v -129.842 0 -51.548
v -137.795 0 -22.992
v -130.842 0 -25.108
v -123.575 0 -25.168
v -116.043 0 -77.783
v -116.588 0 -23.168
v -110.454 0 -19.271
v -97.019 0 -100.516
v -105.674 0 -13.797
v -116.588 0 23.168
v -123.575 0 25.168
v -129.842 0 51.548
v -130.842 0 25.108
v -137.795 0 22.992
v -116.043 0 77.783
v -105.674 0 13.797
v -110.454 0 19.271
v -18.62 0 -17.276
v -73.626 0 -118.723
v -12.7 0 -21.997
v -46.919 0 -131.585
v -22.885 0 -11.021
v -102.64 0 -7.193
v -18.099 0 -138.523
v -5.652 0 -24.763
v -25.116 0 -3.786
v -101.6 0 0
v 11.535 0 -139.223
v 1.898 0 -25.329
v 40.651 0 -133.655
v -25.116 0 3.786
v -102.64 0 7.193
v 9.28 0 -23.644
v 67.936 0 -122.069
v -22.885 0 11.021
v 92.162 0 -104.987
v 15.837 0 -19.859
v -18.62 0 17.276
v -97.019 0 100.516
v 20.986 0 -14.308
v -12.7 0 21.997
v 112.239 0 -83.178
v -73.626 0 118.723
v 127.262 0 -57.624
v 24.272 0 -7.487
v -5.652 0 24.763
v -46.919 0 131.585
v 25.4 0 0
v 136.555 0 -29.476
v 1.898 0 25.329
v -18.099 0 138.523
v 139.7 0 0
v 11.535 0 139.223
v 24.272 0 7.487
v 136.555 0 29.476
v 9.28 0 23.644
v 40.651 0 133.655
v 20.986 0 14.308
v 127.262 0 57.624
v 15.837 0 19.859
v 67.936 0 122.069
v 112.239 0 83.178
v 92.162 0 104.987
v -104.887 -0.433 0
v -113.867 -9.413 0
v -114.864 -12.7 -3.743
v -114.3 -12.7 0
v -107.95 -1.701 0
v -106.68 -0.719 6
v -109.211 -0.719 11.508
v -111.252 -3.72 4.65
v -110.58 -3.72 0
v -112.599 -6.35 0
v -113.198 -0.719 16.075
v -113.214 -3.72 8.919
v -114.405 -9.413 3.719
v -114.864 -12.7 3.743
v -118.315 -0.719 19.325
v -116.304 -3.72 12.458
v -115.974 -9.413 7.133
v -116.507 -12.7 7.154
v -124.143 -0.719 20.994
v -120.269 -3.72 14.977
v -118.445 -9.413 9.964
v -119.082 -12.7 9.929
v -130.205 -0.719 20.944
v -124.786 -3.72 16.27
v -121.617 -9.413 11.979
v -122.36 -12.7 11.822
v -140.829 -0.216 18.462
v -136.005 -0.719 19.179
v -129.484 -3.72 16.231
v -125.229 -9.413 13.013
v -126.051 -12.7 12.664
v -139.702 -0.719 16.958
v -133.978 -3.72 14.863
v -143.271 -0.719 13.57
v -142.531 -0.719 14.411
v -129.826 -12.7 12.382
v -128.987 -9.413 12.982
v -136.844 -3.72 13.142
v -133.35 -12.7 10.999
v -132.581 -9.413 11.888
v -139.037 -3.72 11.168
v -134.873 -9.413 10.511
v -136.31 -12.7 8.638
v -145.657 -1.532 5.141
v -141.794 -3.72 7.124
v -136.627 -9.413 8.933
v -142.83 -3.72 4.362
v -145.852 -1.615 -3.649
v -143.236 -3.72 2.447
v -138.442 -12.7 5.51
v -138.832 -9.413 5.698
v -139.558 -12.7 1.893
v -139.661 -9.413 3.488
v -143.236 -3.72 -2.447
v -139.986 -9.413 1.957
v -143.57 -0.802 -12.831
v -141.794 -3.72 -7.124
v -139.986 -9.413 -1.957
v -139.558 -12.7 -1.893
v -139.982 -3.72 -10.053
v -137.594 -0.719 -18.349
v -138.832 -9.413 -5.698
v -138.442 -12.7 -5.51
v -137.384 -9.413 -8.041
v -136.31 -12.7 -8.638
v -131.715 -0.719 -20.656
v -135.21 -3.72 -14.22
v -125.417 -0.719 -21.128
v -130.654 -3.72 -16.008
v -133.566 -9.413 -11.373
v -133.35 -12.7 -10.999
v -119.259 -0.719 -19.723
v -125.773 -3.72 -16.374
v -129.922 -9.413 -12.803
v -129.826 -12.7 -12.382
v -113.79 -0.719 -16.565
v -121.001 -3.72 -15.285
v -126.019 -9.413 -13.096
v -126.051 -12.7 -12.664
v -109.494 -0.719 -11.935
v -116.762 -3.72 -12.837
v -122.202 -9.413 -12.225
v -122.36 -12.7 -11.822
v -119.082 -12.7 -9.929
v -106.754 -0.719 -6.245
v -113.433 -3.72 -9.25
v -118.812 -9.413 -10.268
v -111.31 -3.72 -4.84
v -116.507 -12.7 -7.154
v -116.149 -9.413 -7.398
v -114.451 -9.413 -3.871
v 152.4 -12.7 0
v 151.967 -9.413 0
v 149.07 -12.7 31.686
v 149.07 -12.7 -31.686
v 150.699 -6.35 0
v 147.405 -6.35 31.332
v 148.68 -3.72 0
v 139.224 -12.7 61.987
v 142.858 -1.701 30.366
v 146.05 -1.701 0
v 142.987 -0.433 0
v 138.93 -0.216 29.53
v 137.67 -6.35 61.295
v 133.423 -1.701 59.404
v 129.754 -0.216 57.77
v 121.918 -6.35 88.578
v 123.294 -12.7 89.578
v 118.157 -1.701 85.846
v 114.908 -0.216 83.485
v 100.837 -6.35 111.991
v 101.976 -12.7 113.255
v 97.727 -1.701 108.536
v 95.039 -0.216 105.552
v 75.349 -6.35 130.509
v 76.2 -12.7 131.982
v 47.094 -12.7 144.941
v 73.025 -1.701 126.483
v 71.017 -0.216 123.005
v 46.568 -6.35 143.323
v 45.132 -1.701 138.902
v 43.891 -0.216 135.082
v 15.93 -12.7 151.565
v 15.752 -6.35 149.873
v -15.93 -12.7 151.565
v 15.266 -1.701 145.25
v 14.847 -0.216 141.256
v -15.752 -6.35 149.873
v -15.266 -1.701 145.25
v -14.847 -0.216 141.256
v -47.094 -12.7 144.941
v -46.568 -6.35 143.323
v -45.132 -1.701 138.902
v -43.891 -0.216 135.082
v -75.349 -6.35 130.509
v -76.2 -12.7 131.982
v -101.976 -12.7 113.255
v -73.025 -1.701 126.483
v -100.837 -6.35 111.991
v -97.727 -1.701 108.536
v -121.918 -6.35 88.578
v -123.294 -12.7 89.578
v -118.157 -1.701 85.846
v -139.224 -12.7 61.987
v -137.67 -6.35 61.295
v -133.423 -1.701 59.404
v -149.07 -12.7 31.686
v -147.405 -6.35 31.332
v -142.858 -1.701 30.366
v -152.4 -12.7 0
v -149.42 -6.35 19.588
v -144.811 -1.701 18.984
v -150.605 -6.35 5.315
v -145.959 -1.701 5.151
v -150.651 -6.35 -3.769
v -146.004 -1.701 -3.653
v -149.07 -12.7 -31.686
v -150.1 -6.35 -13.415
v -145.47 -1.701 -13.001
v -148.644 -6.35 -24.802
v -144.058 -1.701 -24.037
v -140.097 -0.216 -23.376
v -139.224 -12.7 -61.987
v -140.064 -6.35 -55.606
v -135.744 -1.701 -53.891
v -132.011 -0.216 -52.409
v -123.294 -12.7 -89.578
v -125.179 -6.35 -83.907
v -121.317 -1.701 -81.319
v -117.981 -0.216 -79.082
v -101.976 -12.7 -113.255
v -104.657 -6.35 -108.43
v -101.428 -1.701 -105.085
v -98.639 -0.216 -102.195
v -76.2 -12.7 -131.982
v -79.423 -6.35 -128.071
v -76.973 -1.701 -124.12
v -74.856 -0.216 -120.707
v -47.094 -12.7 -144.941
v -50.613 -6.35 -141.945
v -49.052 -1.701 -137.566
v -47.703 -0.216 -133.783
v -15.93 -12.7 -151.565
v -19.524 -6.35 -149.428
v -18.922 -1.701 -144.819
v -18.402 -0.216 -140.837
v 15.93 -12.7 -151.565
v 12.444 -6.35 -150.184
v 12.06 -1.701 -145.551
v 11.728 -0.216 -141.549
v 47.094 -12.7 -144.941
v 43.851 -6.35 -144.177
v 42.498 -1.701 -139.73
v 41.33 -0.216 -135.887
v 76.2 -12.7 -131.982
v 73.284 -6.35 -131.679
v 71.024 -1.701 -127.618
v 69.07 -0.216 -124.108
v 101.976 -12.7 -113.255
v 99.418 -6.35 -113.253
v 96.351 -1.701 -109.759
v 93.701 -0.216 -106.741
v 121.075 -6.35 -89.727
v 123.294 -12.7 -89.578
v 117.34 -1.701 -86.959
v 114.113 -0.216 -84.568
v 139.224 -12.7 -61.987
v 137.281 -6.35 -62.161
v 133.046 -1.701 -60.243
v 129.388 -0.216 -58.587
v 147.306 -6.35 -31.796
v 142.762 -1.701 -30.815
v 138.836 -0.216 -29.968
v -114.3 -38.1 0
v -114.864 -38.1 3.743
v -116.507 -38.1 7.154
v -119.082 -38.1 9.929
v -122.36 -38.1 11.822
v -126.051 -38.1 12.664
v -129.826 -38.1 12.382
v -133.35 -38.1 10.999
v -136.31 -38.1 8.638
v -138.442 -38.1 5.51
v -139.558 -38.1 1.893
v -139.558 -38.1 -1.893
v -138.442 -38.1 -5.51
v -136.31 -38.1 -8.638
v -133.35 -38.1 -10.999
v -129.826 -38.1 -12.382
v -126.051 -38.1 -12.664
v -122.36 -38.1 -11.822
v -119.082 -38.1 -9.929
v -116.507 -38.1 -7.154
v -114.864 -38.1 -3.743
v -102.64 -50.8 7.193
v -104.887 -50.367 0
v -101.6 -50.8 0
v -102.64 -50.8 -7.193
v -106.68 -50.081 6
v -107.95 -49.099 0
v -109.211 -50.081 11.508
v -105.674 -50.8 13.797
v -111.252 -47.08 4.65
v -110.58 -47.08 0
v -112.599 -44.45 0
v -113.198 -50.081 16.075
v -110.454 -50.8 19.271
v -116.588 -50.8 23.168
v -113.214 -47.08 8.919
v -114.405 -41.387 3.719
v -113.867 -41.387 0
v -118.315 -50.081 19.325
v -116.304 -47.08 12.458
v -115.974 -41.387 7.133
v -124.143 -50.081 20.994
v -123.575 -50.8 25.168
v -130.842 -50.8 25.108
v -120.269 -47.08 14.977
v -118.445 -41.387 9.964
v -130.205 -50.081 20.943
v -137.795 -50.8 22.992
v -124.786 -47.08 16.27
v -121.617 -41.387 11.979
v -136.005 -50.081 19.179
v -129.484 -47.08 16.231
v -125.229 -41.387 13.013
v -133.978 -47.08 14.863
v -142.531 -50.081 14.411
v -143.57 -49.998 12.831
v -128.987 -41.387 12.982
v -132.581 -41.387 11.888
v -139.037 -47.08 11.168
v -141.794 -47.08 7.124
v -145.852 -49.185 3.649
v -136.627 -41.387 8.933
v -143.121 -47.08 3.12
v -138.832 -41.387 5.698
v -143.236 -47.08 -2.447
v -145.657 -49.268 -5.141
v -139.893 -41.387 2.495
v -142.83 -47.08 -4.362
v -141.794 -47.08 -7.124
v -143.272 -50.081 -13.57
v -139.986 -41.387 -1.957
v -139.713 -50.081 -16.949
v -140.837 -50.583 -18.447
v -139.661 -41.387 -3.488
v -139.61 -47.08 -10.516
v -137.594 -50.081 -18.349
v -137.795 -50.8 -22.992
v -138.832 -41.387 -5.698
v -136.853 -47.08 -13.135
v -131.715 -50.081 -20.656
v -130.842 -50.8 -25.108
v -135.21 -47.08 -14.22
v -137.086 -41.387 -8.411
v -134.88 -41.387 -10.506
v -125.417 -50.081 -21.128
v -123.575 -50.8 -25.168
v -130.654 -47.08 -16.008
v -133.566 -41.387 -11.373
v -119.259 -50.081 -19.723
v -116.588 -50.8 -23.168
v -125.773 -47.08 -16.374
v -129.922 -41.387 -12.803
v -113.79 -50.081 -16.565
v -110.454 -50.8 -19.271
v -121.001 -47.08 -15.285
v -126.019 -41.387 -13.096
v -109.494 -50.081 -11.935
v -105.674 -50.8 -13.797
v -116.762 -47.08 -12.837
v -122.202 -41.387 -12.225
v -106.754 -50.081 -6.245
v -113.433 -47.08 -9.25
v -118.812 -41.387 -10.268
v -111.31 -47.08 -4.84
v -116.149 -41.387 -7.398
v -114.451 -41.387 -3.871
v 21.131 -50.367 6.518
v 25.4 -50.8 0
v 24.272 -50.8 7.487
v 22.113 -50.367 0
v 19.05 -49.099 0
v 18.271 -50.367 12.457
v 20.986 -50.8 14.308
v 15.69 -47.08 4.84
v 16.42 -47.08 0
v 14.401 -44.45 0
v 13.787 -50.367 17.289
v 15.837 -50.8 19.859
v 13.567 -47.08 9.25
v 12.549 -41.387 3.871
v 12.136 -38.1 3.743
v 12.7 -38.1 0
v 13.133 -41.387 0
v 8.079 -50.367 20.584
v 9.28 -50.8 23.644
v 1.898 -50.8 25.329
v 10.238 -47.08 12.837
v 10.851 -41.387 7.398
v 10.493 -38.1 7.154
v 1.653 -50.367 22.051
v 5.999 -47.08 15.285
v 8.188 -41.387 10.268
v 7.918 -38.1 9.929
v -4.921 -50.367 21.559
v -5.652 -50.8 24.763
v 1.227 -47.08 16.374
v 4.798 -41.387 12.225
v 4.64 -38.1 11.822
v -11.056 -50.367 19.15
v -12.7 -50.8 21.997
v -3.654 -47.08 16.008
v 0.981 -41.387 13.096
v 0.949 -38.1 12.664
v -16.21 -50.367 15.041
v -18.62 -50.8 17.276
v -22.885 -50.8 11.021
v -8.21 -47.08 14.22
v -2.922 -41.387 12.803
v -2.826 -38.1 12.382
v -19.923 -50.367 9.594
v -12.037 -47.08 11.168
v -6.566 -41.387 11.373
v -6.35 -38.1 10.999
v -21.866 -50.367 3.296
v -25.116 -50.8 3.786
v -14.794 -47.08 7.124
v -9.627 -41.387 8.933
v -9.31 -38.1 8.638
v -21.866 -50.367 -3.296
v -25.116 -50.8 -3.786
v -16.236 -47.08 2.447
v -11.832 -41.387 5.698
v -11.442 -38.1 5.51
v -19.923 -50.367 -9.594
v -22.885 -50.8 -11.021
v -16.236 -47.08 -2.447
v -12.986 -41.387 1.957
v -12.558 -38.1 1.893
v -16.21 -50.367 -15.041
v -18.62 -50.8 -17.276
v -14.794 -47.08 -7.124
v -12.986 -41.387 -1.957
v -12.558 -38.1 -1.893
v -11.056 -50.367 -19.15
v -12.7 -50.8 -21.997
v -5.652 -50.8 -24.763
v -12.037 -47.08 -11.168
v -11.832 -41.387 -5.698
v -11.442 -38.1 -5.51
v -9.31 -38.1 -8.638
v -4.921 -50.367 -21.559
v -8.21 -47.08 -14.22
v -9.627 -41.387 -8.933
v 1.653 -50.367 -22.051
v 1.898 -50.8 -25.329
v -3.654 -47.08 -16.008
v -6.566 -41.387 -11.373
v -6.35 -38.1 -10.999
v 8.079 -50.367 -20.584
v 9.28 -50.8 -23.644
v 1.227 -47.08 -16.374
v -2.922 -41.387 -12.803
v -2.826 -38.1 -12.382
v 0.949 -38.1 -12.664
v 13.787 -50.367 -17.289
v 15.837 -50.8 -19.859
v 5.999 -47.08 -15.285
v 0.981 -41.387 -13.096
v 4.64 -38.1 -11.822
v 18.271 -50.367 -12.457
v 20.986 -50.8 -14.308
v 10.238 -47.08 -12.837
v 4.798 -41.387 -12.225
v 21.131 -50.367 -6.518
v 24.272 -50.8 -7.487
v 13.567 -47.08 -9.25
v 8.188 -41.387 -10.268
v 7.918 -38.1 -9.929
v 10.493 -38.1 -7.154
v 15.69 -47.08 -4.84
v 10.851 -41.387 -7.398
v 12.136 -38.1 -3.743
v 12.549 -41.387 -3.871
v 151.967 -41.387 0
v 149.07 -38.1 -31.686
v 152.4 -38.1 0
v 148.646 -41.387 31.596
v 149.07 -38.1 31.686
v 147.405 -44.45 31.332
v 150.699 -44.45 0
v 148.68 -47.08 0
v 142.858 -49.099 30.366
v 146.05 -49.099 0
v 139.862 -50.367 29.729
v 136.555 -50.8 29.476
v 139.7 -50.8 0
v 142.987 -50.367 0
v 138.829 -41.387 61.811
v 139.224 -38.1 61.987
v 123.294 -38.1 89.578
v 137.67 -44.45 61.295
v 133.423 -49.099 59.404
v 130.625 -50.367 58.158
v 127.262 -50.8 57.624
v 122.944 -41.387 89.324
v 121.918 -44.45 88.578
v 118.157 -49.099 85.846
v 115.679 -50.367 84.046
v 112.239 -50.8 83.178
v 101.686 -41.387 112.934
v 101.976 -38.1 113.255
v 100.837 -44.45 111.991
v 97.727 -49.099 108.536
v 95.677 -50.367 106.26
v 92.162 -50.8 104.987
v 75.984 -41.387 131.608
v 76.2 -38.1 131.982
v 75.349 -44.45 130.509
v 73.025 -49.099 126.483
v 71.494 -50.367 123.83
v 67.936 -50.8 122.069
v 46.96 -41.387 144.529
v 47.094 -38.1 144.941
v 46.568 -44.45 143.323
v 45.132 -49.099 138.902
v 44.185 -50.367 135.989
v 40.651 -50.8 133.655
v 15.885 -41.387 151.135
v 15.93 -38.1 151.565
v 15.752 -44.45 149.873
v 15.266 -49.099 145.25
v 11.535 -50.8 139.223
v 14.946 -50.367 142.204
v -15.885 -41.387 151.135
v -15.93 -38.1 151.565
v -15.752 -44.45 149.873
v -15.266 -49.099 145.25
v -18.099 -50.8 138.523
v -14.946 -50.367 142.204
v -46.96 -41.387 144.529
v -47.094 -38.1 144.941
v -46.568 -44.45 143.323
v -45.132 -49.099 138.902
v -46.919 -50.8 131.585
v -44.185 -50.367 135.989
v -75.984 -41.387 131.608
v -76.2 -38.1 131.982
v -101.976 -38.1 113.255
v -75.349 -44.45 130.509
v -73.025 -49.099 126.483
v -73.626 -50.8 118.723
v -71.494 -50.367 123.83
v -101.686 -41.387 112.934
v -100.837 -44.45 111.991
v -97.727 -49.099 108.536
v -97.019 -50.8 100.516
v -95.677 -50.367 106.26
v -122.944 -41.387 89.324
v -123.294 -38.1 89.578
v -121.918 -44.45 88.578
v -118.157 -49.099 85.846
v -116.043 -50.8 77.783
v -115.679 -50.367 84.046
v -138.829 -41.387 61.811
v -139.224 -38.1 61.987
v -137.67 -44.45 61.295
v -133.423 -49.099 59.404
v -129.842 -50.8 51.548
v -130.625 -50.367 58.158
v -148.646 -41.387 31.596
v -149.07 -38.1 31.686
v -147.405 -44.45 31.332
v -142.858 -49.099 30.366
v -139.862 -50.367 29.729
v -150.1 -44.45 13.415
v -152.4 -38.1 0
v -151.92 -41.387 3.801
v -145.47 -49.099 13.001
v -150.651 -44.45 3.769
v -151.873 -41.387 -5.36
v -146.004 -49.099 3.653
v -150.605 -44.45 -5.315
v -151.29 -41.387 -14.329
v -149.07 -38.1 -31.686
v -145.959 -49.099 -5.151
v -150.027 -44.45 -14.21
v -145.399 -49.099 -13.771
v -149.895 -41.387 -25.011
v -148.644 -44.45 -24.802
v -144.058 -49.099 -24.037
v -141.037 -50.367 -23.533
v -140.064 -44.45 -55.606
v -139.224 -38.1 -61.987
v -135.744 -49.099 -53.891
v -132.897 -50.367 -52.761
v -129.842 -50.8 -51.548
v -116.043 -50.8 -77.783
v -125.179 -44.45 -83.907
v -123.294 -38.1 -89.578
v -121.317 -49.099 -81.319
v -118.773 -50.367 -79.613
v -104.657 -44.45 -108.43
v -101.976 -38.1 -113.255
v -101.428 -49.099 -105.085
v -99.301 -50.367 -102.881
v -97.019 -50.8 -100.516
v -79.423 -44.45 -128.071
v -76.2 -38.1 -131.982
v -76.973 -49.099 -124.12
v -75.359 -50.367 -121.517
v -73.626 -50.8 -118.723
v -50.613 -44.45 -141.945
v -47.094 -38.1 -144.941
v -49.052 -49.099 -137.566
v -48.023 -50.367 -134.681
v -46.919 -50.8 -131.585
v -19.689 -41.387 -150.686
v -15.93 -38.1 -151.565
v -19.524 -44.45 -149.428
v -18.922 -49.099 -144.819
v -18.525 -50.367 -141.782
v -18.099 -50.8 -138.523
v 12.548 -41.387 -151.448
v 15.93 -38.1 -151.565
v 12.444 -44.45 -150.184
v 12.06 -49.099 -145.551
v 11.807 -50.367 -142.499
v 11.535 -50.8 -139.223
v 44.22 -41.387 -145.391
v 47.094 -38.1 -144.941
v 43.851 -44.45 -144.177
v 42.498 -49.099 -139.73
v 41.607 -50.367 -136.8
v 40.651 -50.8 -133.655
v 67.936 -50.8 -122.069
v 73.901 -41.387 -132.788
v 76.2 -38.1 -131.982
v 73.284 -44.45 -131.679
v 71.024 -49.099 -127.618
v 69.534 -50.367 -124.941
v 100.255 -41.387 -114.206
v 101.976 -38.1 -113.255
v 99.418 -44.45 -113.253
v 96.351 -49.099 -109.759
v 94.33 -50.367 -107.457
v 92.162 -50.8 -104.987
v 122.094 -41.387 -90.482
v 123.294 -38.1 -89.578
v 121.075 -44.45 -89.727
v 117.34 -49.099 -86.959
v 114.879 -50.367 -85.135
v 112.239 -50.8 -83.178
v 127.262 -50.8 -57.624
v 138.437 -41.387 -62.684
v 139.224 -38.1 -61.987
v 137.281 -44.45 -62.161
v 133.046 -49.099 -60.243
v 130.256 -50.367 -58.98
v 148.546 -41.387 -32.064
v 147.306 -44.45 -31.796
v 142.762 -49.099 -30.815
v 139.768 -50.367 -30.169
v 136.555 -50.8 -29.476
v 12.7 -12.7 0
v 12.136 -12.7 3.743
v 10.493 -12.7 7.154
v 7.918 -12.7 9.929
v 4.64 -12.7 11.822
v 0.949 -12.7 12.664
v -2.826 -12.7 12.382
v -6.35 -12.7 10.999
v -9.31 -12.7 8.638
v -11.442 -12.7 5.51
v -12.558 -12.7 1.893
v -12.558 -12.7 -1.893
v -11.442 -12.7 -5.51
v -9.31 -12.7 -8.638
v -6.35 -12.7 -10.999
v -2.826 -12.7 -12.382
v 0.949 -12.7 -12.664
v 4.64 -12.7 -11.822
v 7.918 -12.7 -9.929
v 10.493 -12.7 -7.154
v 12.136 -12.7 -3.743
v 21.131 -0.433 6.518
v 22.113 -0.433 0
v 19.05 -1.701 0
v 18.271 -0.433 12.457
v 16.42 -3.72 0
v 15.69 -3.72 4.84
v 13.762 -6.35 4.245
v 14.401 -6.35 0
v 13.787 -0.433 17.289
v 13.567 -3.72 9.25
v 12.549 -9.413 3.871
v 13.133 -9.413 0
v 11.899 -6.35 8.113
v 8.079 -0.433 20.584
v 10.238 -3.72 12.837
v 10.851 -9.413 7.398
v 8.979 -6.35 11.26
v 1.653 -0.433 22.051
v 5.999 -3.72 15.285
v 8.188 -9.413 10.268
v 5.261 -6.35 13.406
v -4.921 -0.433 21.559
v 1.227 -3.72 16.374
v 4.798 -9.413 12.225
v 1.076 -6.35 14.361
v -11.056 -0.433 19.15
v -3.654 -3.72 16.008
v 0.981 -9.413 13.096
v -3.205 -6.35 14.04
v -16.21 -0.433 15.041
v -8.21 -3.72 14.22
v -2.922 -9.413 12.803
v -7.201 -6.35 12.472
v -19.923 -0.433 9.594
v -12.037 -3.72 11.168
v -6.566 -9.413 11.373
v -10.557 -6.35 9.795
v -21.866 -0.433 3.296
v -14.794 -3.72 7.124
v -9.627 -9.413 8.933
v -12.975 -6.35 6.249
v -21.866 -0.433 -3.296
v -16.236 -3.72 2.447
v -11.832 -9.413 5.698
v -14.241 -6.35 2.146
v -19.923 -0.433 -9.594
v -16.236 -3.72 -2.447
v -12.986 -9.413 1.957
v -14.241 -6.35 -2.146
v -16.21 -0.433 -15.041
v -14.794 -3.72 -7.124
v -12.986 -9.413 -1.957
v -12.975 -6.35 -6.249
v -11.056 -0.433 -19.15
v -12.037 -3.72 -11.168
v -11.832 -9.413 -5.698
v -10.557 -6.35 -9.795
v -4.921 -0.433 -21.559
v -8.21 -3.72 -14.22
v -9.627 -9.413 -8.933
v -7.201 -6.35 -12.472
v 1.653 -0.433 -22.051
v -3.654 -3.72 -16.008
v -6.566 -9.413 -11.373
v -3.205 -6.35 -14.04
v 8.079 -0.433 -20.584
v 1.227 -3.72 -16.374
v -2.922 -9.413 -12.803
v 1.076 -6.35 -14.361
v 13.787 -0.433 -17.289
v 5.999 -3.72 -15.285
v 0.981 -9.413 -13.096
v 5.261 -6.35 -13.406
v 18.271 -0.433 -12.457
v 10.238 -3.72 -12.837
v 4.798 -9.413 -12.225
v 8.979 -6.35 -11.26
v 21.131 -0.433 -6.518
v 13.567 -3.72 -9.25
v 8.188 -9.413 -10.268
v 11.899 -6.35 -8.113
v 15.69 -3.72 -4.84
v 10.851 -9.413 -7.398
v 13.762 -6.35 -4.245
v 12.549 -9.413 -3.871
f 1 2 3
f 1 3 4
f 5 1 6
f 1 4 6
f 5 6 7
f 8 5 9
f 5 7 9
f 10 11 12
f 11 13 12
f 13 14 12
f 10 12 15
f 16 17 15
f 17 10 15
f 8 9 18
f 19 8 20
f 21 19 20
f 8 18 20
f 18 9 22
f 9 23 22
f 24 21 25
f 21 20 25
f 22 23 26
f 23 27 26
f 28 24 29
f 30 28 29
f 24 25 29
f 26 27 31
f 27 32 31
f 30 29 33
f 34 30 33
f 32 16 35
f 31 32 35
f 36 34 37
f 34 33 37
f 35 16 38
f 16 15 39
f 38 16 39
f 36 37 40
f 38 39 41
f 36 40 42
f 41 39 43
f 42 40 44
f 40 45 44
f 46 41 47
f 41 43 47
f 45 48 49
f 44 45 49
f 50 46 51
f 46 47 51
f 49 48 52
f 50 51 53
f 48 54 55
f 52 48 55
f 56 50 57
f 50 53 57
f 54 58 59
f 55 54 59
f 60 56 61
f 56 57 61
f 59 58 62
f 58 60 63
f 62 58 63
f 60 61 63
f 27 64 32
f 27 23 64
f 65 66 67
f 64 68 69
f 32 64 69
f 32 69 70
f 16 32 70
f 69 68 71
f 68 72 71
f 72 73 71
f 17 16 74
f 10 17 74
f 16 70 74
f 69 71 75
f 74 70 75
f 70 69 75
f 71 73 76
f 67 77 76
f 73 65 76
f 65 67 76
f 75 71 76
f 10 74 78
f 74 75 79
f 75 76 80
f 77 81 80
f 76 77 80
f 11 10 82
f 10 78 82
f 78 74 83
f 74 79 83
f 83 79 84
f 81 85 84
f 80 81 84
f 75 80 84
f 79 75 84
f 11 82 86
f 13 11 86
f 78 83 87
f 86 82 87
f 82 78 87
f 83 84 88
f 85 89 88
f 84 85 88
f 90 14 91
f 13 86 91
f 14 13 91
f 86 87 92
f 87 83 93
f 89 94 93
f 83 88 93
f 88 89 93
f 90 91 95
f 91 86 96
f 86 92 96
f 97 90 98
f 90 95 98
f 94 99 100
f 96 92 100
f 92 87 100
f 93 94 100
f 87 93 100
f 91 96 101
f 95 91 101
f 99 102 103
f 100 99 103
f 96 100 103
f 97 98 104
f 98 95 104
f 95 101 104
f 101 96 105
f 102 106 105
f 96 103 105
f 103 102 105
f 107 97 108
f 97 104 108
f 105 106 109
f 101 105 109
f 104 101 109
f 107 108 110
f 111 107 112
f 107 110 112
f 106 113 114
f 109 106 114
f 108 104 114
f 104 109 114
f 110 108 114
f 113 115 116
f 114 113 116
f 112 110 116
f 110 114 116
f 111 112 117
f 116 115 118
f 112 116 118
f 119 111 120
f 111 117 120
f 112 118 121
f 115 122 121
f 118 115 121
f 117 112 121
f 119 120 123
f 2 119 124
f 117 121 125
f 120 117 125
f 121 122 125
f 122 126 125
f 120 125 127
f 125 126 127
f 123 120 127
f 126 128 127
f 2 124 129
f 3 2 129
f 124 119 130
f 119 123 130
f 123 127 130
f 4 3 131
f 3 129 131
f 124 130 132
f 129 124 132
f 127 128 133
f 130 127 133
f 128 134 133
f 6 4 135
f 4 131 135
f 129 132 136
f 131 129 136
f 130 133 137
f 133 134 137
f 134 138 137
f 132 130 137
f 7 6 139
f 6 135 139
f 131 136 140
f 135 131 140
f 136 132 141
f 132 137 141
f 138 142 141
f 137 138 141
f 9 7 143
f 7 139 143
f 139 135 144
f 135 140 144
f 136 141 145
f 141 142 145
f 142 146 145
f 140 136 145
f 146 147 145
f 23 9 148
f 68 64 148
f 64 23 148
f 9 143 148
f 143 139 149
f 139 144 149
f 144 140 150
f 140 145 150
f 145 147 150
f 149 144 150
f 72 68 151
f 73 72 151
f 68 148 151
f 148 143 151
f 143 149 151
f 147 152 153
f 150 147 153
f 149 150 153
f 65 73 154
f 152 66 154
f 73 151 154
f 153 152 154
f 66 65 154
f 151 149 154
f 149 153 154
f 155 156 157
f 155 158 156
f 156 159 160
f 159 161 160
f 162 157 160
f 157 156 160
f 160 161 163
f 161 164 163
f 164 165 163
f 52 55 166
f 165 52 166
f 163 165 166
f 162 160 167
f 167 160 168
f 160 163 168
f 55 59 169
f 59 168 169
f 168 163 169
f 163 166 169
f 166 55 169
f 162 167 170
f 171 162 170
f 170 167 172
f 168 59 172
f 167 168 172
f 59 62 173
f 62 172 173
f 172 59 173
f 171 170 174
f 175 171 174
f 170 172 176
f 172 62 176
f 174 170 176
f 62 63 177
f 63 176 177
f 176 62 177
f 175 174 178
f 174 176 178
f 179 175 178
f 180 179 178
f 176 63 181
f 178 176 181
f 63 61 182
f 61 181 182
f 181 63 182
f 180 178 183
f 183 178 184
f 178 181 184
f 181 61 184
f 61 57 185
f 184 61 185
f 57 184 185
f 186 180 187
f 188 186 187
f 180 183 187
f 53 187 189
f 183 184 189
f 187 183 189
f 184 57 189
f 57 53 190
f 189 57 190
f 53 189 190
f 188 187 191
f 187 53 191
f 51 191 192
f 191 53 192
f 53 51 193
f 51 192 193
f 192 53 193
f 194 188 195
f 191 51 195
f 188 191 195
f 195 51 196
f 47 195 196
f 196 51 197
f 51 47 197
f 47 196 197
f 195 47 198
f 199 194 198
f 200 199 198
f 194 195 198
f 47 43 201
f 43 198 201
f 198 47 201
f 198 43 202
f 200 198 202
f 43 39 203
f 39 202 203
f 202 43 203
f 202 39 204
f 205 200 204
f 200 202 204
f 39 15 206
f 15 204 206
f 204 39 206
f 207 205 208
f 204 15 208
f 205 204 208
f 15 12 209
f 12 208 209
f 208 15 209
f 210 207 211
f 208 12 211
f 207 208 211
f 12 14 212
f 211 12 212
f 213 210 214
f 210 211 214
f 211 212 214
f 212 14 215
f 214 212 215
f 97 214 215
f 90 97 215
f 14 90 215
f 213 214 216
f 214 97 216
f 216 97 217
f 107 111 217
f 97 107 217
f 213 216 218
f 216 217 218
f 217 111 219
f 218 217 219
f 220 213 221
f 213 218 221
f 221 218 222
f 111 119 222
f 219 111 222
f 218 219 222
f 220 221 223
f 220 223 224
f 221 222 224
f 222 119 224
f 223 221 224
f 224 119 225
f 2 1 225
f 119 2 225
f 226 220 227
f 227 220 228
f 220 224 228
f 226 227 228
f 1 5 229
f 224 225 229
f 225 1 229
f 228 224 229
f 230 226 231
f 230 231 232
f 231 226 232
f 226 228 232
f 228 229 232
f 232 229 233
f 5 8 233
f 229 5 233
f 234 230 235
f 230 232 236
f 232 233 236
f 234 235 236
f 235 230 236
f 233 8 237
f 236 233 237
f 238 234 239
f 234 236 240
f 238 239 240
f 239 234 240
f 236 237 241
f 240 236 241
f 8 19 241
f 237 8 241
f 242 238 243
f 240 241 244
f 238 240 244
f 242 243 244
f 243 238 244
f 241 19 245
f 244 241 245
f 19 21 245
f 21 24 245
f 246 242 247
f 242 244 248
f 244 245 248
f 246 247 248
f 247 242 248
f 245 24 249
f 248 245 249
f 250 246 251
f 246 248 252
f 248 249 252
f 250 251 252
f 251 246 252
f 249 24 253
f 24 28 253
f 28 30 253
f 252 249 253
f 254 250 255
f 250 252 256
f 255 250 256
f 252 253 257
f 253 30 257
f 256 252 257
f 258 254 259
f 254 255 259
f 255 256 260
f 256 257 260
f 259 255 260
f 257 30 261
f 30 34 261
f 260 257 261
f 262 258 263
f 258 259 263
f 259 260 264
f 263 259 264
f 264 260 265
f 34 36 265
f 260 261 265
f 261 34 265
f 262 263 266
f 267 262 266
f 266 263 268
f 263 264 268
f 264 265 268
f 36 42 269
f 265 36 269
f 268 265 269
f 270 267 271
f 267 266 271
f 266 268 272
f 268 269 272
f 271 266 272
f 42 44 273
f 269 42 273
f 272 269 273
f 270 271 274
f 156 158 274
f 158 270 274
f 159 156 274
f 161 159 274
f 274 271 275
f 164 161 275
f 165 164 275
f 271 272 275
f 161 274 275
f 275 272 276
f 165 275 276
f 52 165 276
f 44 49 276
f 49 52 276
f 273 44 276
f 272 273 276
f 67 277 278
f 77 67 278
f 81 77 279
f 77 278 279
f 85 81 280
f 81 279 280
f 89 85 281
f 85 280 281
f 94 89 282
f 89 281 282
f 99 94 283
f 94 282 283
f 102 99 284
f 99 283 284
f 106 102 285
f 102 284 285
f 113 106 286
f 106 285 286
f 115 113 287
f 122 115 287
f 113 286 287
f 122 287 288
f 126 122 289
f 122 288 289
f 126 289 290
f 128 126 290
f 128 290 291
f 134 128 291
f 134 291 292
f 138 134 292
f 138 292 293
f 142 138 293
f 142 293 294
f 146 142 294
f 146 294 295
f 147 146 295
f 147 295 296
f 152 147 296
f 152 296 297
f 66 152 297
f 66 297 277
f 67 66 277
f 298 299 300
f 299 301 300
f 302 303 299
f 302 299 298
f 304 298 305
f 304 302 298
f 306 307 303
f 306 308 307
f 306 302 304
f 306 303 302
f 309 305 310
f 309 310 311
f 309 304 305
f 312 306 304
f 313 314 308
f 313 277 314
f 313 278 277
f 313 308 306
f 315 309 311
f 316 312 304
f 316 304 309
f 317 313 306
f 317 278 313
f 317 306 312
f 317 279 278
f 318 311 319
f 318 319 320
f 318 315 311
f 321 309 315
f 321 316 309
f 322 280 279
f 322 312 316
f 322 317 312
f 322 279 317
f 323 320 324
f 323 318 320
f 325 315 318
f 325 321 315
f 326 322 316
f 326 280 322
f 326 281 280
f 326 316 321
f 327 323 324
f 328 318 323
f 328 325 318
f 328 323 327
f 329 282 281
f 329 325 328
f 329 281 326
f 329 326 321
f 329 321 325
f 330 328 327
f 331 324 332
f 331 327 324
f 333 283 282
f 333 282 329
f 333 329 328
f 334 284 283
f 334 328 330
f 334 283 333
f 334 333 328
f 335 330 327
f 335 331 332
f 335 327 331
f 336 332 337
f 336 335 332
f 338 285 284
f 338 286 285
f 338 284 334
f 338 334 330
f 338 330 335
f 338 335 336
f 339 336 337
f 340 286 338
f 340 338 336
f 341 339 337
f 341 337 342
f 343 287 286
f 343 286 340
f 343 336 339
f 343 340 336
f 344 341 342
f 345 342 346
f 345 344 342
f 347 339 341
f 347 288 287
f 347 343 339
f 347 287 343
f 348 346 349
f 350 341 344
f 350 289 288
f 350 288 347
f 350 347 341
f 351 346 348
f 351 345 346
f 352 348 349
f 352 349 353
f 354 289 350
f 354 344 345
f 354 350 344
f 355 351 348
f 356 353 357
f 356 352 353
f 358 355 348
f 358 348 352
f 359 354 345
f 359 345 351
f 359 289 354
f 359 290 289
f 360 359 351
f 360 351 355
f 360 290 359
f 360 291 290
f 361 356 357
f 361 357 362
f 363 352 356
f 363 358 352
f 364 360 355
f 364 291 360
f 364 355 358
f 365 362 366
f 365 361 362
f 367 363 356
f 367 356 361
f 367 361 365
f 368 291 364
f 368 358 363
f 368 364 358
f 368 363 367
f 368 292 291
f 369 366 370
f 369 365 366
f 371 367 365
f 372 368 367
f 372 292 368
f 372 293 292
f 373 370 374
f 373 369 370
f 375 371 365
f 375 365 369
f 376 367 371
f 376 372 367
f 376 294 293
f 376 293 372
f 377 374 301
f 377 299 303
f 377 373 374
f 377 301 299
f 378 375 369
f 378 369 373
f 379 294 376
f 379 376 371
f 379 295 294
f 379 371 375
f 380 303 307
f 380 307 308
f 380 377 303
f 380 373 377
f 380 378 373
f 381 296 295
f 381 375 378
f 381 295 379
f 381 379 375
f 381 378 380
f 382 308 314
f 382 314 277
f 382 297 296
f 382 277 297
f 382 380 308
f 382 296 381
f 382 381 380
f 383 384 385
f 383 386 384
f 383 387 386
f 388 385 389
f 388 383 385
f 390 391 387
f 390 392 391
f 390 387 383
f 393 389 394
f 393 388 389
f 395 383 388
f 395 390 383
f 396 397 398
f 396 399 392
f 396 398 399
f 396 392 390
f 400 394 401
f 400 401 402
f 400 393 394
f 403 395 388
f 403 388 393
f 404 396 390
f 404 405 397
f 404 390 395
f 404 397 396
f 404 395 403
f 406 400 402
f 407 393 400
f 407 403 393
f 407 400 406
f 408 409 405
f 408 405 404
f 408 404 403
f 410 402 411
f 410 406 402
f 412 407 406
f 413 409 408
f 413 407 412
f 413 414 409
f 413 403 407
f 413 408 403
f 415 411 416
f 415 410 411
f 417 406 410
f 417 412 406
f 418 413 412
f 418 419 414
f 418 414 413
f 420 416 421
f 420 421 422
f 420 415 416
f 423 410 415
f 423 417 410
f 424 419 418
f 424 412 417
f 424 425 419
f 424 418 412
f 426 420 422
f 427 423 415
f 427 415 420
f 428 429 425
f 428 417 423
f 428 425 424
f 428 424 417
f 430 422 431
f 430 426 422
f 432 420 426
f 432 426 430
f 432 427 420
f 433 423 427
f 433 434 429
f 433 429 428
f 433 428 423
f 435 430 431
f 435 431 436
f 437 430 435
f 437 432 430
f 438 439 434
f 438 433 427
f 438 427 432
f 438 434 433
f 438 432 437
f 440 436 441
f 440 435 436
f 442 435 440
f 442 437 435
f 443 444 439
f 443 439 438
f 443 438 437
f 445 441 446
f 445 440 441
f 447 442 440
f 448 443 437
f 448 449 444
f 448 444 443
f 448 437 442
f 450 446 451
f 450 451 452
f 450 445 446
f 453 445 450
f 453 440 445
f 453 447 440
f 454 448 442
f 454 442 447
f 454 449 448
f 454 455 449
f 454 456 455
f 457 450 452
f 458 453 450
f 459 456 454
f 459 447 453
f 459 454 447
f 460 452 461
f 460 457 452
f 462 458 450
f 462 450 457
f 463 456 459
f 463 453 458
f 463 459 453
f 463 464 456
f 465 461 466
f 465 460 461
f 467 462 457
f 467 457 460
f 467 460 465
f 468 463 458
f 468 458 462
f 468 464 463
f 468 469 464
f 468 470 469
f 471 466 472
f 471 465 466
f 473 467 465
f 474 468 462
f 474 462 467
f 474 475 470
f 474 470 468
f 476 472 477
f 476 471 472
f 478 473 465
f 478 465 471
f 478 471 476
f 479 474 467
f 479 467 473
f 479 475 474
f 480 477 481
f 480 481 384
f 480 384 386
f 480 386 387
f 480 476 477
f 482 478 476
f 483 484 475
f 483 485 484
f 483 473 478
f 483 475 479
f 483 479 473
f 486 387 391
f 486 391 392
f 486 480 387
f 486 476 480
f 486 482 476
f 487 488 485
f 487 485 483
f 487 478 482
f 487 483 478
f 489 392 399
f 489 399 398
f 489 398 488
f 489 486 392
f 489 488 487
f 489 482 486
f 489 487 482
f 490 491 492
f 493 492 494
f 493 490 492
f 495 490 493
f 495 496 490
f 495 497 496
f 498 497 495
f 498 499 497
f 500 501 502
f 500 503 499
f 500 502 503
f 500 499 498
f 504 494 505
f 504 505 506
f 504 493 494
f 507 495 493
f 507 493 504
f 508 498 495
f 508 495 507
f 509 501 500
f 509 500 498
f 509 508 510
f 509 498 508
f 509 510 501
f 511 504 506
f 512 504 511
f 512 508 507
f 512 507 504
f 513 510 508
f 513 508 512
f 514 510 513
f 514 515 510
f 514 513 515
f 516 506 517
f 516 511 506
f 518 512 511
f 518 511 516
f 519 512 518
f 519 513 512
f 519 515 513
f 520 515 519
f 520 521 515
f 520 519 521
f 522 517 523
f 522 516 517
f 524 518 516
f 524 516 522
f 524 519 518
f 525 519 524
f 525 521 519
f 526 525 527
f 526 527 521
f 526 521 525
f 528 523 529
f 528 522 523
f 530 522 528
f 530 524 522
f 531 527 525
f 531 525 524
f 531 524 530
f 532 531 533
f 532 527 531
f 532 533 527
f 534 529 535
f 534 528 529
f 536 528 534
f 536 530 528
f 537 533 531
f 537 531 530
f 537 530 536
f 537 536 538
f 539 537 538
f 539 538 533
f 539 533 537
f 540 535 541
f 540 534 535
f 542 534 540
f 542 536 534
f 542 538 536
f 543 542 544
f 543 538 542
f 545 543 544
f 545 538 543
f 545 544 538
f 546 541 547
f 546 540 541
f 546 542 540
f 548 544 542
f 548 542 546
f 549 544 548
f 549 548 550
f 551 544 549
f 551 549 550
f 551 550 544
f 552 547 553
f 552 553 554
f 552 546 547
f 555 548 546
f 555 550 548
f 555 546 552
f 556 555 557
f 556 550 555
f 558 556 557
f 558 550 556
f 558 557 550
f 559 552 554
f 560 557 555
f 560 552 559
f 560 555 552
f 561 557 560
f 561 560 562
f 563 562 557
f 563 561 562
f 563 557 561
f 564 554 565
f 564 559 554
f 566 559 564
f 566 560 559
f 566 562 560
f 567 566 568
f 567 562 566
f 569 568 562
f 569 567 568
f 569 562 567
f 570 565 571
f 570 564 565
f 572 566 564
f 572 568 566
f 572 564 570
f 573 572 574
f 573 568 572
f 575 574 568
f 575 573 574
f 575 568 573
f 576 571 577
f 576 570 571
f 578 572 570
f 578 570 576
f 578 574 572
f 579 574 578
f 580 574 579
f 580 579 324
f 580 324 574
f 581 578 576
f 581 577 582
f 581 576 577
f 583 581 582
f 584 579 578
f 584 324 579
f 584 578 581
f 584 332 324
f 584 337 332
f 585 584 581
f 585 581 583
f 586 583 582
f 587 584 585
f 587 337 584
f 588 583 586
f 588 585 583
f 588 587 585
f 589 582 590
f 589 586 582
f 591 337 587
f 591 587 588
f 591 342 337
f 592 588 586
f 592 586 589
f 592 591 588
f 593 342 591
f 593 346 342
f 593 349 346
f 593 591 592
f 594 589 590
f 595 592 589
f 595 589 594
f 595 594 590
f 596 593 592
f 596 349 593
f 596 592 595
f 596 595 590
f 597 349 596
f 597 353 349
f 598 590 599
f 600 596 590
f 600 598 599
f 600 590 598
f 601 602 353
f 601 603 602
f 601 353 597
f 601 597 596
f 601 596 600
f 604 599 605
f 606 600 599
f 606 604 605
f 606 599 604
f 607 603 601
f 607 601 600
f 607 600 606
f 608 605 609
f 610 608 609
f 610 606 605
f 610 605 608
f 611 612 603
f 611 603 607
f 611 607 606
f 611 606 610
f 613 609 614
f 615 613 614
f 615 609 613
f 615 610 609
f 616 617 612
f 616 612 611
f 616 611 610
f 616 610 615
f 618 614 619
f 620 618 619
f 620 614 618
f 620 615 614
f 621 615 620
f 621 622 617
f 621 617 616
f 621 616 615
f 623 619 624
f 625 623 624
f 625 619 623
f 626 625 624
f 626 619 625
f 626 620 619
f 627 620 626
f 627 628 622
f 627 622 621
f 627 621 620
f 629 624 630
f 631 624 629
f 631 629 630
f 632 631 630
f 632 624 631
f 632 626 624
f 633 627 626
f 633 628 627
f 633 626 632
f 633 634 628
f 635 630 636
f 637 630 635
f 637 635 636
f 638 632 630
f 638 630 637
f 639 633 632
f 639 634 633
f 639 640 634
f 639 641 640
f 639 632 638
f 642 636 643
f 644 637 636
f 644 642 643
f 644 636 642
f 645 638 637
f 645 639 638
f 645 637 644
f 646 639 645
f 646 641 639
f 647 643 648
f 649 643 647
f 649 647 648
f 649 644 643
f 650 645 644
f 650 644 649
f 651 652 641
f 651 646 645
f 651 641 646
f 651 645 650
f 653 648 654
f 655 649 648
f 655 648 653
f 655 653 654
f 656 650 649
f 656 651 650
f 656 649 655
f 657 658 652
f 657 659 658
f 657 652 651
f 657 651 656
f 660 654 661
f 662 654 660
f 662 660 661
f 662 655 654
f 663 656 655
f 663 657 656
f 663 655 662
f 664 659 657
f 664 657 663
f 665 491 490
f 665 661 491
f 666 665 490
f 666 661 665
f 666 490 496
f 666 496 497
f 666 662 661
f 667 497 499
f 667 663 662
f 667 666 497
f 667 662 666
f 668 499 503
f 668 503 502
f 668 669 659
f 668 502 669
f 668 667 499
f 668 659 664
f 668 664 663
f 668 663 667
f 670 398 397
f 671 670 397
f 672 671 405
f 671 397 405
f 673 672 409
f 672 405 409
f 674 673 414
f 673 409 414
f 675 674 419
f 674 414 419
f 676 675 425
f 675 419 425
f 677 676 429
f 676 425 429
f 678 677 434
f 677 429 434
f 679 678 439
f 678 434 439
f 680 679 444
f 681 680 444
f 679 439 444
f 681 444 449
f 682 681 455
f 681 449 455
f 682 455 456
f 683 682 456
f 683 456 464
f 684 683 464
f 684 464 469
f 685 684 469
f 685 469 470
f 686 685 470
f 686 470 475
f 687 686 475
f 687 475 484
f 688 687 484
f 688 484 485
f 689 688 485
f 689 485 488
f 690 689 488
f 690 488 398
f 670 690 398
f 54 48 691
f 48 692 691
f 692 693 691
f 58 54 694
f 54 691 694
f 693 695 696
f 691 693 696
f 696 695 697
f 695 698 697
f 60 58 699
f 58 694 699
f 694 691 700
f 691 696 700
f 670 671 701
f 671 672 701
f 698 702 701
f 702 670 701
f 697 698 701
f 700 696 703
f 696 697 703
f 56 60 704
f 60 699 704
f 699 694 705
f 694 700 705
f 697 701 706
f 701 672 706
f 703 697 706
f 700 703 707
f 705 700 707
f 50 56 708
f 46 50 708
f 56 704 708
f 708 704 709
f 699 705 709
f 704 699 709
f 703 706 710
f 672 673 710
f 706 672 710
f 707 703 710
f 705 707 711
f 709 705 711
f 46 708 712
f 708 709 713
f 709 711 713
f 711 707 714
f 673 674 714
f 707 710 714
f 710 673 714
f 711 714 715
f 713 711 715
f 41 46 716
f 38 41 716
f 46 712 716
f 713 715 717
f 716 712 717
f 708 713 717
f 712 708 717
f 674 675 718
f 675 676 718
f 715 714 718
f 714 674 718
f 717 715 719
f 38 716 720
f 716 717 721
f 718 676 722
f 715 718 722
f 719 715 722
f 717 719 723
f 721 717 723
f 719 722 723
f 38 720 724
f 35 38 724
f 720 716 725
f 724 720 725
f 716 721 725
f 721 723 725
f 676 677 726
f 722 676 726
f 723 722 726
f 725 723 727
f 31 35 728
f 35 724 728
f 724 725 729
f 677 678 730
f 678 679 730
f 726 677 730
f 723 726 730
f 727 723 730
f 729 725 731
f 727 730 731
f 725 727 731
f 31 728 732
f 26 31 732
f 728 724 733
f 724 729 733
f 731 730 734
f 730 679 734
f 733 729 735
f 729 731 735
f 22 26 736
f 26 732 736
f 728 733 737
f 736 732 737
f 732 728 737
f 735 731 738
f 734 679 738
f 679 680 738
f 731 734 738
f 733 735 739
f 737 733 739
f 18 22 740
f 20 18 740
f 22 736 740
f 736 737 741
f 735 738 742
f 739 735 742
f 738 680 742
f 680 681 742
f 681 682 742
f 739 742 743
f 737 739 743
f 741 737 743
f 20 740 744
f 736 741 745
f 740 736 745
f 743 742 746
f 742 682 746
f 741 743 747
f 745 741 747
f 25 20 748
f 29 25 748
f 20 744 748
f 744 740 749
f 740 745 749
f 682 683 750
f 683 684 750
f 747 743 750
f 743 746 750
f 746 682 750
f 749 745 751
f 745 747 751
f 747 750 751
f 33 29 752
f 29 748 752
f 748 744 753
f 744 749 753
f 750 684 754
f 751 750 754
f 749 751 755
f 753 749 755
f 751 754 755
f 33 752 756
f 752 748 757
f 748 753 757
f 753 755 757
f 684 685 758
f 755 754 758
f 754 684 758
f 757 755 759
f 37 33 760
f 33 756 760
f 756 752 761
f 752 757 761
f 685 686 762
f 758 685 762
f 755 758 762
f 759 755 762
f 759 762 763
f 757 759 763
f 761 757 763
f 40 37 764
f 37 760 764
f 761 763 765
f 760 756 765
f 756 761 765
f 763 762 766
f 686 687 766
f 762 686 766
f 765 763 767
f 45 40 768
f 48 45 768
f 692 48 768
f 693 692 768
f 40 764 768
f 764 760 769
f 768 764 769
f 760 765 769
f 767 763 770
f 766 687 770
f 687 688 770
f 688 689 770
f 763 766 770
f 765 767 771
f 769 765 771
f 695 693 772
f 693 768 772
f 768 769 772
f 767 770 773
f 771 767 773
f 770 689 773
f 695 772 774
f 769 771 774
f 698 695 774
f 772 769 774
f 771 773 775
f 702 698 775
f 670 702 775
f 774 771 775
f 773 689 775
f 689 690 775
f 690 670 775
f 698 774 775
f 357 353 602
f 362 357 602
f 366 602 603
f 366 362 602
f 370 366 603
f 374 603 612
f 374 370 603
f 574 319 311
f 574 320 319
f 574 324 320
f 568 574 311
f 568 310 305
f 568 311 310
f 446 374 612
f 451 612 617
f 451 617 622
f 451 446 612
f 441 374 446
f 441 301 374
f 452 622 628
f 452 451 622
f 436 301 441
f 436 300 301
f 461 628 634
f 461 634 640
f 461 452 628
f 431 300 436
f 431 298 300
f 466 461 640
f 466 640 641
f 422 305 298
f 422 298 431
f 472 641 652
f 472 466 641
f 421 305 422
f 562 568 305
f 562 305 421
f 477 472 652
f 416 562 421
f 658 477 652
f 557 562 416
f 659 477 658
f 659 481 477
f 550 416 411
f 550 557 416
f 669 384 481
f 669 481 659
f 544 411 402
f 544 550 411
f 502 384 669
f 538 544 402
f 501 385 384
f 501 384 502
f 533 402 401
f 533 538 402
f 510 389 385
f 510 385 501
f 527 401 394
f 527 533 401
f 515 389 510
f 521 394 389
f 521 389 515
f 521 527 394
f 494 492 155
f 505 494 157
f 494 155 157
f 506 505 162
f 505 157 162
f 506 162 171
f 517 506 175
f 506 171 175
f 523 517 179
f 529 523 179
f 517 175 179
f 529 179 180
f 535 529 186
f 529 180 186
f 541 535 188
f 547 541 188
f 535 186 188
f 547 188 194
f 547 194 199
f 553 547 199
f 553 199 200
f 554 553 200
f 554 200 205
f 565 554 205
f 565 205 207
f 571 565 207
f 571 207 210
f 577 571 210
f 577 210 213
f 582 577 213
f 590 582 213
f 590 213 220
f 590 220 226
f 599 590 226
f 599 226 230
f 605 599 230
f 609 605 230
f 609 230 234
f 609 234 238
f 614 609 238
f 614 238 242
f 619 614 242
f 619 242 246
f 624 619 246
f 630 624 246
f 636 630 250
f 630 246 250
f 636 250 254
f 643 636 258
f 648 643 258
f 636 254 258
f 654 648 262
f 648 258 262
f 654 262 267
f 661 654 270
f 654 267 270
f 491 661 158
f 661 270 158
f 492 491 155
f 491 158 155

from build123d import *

# Parameters (mm, degrees)
F0_R     = 152.4
F1_DEPTH = 50.8
F2_R     = 12.7
F3_DEPTH = 50.801


# Not quite as in the source:
# - a fillet or chamfer that OpenCascade refuses, or shapes differently, is made with other operations: its cross-section is extruded or revolved along the edge and cut away or added


with BuildPart() as f1:
    # F0 (on Front) → F1 (new body)
    with BuildSketch(Plane.XZ):
        Circle(F0_R)
    extrude(amount=F1_DEPTH)

    # F2 (on face) → F3 (cut, through all)
    with BuildSketch(Plane.XZ.offset(50.8)):
        Circle(F2_R)
        with Locations((-127, 0)):
            Circle(F2_R)
    extrude(amount=-F3_DEPTH, mode=Mode.SUBTRACT)

    # F4: fillet of radius 12.7 on 6 edges, made by hand

    # F4_s1 → F4_t2 (revolve, cut)
    with BuildSketch(Plane.XY):
        with BuildLine():
            ThreePointArc((152.4, -38.1), (148.6802561211, -47.0802561211), (139.7, -50.8))
            Line((139.7, -50.8), (152.4, -50.8))
            Line((152.4, -50.8), (152.4, -38.1))
        make_face()
    revolve(axis=Axis((0, -50.8, 0), (0, -1, 0)), mode=Mode.SUBTRACT)

    # F4_s3 → F4_t4 (revolve, cut)
    with BuildSketch(Plane.XY):
        with BuildLine():
            ThreePointArc((-101.6, -50.8), (-110.5802561211, -47.0802561211), (-114.3, -38.1))
            Line((-114.3, -38.1), (-114.3, -50.8))
            Line((-114.3, -50.8), (-101.6, -50.8))
        make_face()
    revolve(axis=Axis((-127, -50.8, 0), (0, -1, 0)), mode=Mode.SUBTRACT)

    # F4_s5 → F4_t6 (revolve, cut)
    with BuildSketch(Plane.XY):
        with BuildLine():
            ThreePointArc((25.4, -50.8), (16.4197438789, -47.0802561211), (12.7, -38.1))
            Line((12.7, -38.1), (12.7, -50.8))
            Line((12.7, -50.8), (25.4, -50.8))
        make_face()
    revolve(axis=Axis((0, -50.8, 0), (0, -1, 0)), mode=Mode.SUBTRACT)

    # F4_s7 → F4_t8 (revolve, cut)
    with BuildSketch(Plane.XY):
        with BuildLine():
            ThreePointArc((152.4, -12.7), (148.6802561211, -3.7197438789), (139.7, 0))
            Line((139.7, 0), (152.4, 0))
            Line((152.4, 0), (152.4, -12.7))
        make_face()
    revolve(axis=Axis((0, 0, 0), (0, -1, 0)), mode=Mode.SUBTRACT)

    # F4_s9 → F4_t10 (revolve, cut)
    with BuildSketch(Plane.XY):
        with BuildLine():
            ThreePointArc((-101.6, 0), (-110.5802561211, -3.7197438789), (-114.3, -12.7))
            Line((-114.3, -12.7), (-114.3, 0))
            Line((-114.3, 0), (-101.6, 0))
        make_face()
    revolve(axis=Axis((-127, 0, 0), (0, -1, 0)), mode=Mode.SUBTRACT)

    # F4_s11 → F4_t12 (revolve, cut)
    with BuildSketch(Plane.XY):
        with BuildLine():
            ThreePointArc((25.4, 0), (16.4197438789, -3.7197438789), (12.7, -12.7))
            Line((12.7, -12.7), (12.7, 0))
            Line((12.7, 0), (25.4, 0))
        make_face()
    revolve(axis=Axis((0, 0, 0), (0, -1, 0)), mode=Mode.SUBTRACT)


solid = f1.part
